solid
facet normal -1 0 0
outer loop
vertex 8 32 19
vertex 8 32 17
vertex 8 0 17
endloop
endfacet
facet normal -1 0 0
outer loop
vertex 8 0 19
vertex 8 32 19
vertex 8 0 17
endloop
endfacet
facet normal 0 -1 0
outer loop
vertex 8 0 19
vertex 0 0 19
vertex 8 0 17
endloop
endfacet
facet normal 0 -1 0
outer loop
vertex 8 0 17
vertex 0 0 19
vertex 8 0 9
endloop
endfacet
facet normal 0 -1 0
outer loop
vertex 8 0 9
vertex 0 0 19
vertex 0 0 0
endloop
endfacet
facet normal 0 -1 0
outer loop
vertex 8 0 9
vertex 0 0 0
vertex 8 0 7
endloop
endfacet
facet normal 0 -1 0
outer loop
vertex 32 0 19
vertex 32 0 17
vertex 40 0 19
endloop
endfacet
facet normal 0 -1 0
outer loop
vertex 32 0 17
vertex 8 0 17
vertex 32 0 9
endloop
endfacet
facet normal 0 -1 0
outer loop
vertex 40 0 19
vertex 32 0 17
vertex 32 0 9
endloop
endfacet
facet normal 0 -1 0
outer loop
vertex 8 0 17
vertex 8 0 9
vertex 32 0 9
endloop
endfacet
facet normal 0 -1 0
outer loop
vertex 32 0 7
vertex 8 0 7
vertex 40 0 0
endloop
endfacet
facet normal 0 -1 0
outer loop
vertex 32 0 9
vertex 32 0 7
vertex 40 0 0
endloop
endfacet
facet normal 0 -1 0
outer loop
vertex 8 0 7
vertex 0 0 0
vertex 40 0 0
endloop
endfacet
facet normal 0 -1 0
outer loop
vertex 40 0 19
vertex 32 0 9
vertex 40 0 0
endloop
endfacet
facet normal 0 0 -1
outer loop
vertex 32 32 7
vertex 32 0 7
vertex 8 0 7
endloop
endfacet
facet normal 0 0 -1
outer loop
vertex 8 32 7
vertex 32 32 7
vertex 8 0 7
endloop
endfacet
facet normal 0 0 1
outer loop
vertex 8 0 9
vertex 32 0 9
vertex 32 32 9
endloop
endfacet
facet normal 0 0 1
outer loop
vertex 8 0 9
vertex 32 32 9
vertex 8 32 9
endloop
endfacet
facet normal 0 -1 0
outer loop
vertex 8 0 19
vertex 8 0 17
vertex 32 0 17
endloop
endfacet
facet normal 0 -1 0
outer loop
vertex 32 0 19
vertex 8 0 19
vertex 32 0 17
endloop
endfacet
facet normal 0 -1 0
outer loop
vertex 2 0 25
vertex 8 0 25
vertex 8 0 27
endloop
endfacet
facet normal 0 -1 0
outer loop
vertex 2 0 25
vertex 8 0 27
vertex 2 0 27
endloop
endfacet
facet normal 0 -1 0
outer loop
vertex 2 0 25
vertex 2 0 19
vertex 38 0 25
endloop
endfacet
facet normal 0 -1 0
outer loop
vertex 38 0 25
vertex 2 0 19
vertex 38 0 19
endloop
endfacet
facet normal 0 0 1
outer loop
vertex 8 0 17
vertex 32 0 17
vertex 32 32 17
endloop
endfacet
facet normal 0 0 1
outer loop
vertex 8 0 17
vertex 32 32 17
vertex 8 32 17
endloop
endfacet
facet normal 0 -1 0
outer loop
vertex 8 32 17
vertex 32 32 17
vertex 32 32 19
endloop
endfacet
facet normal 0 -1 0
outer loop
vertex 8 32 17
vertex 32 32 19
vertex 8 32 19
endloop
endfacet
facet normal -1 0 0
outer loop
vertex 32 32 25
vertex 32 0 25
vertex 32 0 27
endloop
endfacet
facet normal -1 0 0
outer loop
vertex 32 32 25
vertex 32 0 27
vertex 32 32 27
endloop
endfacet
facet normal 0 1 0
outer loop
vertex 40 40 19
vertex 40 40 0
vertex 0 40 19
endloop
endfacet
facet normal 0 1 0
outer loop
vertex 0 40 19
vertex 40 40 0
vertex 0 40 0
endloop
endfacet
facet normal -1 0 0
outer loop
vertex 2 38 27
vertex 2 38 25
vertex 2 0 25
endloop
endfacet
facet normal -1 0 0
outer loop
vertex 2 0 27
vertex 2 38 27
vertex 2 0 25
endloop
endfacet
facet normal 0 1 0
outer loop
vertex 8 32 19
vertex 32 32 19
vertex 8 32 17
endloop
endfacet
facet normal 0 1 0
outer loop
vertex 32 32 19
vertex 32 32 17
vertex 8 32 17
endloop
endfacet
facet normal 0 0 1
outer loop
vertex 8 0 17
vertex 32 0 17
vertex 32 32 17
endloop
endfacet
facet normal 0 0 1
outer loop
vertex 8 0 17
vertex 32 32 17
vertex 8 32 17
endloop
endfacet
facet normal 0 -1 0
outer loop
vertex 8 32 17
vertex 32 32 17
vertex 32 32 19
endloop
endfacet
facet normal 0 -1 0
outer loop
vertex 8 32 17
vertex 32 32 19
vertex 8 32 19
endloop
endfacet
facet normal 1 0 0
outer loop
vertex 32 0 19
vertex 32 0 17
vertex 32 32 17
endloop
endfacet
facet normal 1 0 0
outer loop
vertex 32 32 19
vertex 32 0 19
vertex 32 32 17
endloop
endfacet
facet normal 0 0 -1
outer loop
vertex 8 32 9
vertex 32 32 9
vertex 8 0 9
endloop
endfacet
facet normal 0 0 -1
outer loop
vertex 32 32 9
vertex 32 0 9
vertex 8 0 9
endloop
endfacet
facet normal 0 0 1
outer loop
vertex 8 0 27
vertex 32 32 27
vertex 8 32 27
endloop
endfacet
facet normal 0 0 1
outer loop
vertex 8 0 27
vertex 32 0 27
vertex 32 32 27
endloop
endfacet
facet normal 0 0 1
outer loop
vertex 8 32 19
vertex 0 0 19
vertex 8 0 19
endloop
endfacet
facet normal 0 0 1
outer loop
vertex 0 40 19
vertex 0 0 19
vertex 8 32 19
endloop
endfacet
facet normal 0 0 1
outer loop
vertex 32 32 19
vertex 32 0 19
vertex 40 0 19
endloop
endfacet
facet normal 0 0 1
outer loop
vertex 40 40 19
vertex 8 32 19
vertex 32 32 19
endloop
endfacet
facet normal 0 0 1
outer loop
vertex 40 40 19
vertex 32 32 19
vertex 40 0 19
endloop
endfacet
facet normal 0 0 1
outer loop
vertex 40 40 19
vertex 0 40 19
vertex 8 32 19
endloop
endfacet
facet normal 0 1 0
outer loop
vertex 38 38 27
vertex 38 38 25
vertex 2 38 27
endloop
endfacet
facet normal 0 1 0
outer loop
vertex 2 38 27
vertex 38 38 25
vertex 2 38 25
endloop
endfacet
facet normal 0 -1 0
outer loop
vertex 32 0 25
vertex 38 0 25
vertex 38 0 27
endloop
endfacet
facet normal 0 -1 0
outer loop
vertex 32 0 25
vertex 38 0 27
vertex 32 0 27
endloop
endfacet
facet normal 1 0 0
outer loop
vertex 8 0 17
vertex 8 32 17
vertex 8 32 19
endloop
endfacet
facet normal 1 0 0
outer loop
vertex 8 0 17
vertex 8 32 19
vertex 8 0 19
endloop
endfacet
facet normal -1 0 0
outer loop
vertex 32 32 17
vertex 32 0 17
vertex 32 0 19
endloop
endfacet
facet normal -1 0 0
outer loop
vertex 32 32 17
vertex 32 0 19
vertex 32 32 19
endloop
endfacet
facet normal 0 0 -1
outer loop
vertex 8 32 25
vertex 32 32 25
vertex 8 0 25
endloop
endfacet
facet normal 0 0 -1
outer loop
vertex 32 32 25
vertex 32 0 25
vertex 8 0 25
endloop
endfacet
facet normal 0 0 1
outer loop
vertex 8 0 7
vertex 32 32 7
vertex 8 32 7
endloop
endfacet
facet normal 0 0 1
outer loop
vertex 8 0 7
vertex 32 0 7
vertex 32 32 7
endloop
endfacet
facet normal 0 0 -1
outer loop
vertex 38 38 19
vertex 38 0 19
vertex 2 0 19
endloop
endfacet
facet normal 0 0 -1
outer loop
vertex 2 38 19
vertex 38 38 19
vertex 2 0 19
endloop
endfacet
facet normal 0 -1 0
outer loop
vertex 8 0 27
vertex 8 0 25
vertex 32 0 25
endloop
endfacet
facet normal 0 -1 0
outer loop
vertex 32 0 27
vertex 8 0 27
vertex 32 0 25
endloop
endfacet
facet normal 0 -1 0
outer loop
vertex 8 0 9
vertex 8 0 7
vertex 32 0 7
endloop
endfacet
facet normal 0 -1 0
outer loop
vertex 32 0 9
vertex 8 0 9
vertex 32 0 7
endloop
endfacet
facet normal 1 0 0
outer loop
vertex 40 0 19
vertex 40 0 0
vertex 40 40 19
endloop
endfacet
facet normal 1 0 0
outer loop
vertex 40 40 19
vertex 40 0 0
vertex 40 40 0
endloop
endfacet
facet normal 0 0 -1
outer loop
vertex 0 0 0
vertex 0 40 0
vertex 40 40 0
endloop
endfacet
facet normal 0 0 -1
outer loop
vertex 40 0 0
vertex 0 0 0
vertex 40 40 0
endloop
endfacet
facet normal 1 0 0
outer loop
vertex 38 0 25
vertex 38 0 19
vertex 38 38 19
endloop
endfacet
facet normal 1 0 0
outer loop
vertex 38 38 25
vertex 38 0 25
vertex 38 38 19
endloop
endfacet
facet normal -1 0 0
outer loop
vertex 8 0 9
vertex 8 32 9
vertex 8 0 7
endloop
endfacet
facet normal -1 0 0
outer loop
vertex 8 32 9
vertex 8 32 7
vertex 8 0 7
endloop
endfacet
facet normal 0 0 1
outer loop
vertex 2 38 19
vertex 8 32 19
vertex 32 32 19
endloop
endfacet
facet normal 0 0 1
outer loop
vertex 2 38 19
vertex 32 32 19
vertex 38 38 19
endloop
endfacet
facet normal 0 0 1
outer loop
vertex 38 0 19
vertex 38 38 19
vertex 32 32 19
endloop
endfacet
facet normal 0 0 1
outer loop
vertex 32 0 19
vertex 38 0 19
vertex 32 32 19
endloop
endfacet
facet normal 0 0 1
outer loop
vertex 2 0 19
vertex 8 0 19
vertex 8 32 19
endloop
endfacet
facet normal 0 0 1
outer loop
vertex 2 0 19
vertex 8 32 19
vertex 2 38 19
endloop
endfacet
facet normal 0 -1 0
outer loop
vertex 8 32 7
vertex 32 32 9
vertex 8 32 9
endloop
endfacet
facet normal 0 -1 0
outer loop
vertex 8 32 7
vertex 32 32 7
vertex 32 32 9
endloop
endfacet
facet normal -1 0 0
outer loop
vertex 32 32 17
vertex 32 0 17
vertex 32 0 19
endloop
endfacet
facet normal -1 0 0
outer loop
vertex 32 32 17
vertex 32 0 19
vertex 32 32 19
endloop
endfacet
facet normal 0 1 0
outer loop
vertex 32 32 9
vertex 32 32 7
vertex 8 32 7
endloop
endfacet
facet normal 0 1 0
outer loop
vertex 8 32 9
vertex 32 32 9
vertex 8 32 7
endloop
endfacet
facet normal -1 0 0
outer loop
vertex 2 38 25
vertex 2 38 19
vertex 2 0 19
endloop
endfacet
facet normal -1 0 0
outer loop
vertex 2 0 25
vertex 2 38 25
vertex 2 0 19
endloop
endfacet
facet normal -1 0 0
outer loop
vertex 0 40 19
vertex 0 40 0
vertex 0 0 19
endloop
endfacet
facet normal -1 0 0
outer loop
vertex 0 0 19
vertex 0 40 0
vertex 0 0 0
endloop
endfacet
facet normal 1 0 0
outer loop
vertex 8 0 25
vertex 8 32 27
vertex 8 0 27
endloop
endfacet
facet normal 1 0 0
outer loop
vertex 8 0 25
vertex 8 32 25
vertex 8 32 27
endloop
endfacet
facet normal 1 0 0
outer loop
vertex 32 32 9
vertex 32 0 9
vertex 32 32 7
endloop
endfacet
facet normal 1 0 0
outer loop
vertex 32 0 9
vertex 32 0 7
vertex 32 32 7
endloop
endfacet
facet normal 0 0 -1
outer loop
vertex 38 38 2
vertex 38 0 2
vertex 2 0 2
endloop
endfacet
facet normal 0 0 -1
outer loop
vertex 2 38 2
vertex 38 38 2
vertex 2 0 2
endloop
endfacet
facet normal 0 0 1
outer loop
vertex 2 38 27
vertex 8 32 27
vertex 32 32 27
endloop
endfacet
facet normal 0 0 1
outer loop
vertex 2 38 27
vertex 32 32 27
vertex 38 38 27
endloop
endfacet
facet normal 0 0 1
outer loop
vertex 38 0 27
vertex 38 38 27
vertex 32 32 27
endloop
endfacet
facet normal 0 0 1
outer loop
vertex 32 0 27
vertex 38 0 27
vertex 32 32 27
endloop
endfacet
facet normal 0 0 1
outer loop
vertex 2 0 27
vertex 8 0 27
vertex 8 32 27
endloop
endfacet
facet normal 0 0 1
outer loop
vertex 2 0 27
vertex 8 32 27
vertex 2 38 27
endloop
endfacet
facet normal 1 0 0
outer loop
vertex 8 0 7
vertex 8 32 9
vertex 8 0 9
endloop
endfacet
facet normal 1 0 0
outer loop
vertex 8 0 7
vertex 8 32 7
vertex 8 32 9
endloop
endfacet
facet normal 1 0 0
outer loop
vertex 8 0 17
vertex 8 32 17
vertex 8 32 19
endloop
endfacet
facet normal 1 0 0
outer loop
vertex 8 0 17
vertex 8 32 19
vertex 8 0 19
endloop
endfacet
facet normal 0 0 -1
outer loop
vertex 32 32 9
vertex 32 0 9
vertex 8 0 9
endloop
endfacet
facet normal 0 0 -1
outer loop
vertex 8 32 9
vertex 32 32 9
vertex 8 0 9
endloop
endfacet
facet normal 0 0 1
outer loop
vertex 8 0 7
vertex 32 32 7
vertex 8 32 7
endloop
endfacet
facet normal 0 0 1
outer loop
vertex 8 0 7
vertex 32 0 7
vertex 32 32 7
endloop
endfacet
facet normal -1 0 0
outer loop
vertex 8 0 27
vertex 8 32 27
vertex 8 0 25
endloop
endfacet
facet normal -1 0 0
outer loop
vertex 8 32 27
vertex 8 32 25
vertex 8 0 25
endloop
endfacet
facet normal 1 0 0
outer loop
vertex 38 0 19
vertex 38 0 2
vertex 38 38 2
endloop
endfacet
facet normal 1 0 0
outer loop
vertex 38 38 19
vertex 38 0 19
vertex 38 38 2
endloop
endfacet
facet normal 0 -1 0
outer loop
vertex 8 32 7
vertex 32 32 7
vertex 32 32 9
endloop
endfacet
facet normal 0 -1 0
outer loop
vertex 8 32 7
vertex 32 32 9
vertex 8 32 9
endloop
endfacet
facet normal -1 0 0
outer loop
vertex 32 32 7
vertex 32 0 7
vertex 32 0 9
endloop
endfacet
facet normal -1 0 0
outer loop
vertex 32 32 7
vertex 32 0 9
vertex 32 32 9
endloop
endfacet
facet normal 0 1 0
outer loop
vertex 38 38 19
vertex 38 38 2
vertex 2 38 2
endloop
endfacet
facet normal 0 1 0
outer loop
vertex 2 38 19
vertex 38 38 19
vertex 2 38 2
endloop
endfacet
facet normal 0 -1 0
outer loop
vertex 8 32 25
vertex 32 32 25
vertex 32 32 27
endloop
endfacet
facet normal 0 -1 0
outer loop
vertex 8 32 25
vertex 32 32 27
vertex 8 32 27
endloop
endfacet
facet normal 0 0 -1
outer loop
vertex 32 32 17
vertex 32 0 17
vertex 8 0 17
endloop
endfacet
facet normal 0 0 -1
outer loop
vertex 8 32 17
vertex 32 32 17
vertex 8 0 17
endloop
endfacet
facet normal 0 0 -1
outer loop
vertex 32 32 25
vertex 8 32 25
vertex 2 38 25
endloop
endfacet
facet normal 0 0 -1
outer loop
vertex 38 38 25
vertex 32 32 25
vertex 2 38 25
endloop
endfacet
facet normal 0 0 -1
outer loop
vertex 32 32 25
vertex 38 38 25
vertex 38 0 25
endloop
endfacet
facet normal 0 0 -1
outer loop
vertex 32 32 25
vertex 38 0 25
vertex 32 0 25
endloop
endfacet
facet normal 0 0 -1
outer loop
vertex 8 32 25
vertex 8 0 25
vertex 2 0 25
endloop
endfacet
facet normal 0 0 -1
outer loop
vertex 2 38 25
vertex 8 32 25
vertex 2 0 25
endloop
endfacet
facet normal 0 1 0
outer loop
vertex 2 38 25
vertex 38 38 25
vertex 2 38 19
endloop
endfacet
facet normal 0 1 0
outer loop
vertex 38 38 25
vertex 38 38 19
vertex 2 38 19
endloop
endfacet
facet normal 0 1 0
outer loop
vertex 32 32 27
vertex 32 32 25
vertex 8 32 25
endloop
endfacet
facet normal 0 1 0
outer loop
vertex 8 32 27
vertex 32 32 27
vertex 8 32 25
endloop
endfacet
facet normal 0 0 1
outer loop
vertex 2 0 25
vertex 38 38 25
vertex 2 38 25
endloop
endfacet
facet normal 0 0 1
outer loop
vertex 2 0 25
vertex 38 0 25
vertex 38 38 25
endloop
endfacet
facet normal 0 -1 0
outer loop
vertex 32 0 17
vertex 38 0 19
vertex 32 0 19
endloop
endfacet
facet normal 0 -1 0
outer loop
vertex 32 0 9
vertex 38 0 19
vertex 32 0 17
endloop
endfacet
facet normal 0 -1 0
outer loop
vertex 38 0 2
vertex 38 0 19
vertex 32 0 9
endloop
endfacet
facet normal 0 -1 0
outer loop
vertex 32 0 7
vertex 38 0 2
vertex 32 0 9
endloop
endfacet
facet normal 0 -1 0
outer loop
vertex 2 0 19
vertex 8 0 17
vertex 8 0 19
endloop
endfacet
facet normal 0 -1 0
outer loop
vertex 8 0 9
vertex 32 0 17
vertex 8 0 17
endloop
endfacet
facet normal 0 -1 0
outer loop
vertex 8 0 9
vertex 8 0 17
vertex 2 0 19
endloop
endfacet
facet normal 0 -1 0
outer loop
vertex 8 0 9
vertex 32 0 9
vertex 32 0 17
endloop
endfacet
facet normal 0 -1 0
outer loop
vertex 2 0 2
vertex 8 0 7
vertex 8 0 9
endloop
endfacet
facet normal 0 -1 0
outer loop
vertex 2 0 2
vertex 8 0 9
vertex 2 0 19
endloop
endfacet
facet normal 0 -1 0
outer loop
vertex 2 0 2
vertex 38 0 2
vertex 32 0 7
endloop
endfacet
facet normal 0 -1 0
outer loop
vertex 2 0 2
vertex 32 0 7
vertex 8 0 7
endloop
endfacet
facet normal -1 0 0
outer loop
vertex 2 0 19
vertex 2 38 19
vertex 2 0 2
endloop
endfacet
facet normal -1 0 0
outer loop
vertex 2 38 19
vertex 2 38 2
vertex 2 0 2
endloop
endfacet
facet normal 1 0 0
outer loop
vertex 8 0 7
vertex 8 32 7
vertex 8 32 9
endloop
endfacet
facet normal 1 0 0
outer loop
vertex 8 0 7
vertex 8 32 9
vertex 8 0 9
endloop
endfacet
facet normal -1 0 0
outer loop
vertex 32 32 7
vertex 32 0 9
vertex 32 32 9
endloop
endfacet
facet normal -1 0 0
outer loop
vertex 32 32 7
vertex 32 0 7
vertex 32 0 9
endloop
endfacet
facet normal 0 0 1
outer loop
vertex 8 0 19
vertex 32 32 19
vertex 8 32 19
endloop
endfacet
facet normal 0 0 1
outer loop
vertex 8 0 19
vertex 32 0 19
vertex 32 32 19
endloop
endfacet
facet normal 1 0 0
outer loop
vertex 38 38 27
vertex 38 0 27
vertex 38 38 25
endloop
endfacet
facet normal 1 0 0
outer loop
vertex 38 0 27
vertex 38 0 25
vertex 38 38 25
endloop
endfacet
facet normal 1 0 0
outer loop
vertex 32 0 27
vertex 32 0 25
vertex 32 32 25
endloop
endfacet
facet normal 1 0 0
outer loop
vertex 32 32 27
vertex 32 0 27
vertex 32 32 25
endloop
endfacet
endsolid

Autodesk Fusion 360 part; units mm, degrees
sketch "Esquisse1" plane through (0, 0, 0) normal (0, 0, 1) x (1, 0, 0)
  line L0 (0, 0) -> (40, 0)
  line L1 (40, 0) -> (40, 40)
  line L2 (40, 40) -> (0, 40)
  line L3 (0, 40) -> (0, 0)
  dimension "d11" = 40
  dimension "d12" = 40
sketch "Esquisse1 (2)" plane through (0, 0, 2) normal (0, 0, 1) x (-1, 0, 0) in component "Shield"
  line L0 (0, -36) -> (0, 0)
  line L1 (0, 0) -> (-36, 0)
  line L2 (-36, 0) -> (-36, -36)
  line L3 (-36, -36) -> (0, -36)
  line L4 (0, -36) -> (-2, -36)
  line L5 (-2, -36) -> (-2, 4)
  line L6 (-2, 4) -> (0, 4)
  line L7 (0, 4) -> (0, -36)
  line L8 (0, -36) -> (-40, -36)
  line L9 (-40, -36) -> (-40, -34)
  line L10 (-40, -34) -> (0, -34)
  line L11 (0, -34) -> (0, -36)
  line L12 (-40, -36) -> (-38, -36)
  line L13 (-38, -36) -> (-38, 4)
  line L14 (-38, 4) -> (-40, 4)
  line L15 (-40, 4) -> (-40, -36)
  line L16 (-40, 4) -> (0, 4)
  line L17 (0, 4) -> (0, 2)
  line L18 (0, 2) -> (-40, 2)
  line L19 (-40, 2) -> (-40, 4)
  dimension "d15" = 2
  dimension "d16" = 40
  dimension "d17" = 40
  dimension "d18" = 2
  dimension "d19" = 2
  dimension "d20" = 40
  dimension "d21" = 40
  dimension "d22" = 2
sketch "Esquisse2" plane through (0, 0, 2) normal (0, 0, 1) x (-1, 0, 0) in component "Shield"
  line L0 (-36, -2) -> (-34, -2)
  line L1 (-34, -2) -> (-34, -34)
  line L2 (-34, -34) -> (-2, -34)
  line L3 (-2, -34) -> (-2, -2)
  line L4 (-2, -2) -> (0, -2)
  line L5 (0, -2) -> (0, 0)
  line L6 (0, 0) -> (-36, 0)
  line L7 (-36, 0) -> (-36, -2)
sketch "Esquisse1 (3)" plane through (0, 0, 6) normal (0, 0, 1) x (-1, 0, 0) in component "e*"
  line L0 (-36, 0) -> (-36, -2)
  line L1 (-36, -2) -> (-34, -2)
  line L2 (-34, -2) -> (-34, -34)
  line L3 (-34, -34) -> (-2, -34)
  line L4 (-2, -34) -> (-2, -2)
  line L5 (-2, -2) -> (0, -2)
  line L6 (0, -2) -> (0, 0)
  line L7 (0, 0) -> (-36, 0)
  line L8 (-8, -28) -> (-28, -28)
  line L9 (-28, -28) -> (-28, -3.2536)
  line L10 (-28, -3.2536) -> (-8, -3.2536)
  line L11 (-8, -3.2536) -> (-8, -28)
  dimension "d27" = 6
  dimension "d28" = 6
  dimension "d30" = 6
sketch "Esquisse1 (4)" plane through (0, 0, 16) normal (0, 0, 1) x (-1, 0, 0) in component "plaque_haut"
  line L0 (-2, 0) -> (-34, 0)
  line L1 (-34, 0) -> (-34, -34)
  line L2 (-34, -34) -> (-2, -34)
  line L3 (-2, -34) -> (-2, 0)
  line L4 (-6, -30) -> (-30, -30)
  line L5 (-30, -30) -> (-30, 0)
  line L6 (-30, 0) -> (-6, 0)
  line L7 (-6, 0) -> (-6, -30)
  dimension "d39" = 24
  dimension "d40" = 30
sketch "Esquisse1 (5)" plane through (0, 0, 18) normal (0, 0, 1) x (-1, 0, 0) in component "Mousse_haute"
  line L0 (0, -36) -> (0, -2)
  line L1 (0, -2) -> (-2, -2)
  line L2 (-2, -2) -> (-2, -34)
  line L3 (-2, -34) -> (-34, -34)
  line L4 (-34, -34) -> (-34, -2)
  line L5 (-34, -2) -> (-36, -2)
  line L6 (-36, -2) -> (-36, -36)
  line L7 (-36, -36) -> (0, -36)
  line L8 (0, -36) -> (-36, -36)
  line L9 (-36, -36) -> (-36, 0)
  line L10 (-36, 0) -> (0, 0)
  line L11 (0, 0) -> (0, -36)
sketch "Esquisse2 (2)" plane through (0, 0, 0) normal (0, 0, 1) x (1, 0, 0)
  line L0 (0, 0) -> (40, 0)
  line L1 (40, 0) -> (40, 40)
  line L2 (40, 40) -> (0, 40)
  line L3 (0, 40) -> (0, 0)
  dimension "d85" = 40
  dimension "d86" = 40
extrude "Extrusion4" add sketch "Esquisse2 (2)" along normal blind 2 makes body 1 in component "Shield"
sketch "Esquisse3" plane through (0, 0, 2) normal (0, 0, 1) x (-1, 0, 0)
  line L0 (0, -40) -> (0, 0)
  line L1 (0, 0) -> (-40, 0)
  line L2 (-40, 0) -> (-40, -40)
  line L3 (-40, -40) -> (0, -40)
  line L4 (0, -40) -> (-2, -40)
  line L5 (-2, -40) -> (-2, 0)
  line L6 (-2, 0) -> (0, 0)
  line L7 (0, 0) -> (0, -40)
  line L8 (0, -40) -> (-40, -40)
  line L9 (-40, -40) -> (-40, -38)
  line L10 (-40, -38) -> (0, -38)
  line L11 (0, -38) -> (0, -40)
  line L12 (-40, -40) -> (-38, -40)
  line L13 (-38, -40) -> (-38, 0)
  line L14 (-38, 0) -> (-40, 0)
  line L15 (-40, 0) -> (-40, -40)
  dimension "d89" = 2
  dimension "d90" = 40
  dimension "d91" = 40
  dimension "d92" = 2
  dimension "d93" = 2
  dimension "d94" = 40
extrude "Extrusion15" add sketch "Esquisse3" along normal blind 5 separate body contours L1 L5 L10 L13 makes body 2 in component "Support"
sketch "Esquisse1 (6)" plane through (0, 0, 7) normal (0, 0, 1) x (-1, 0, 0) in component "Plaque bas"
  line L0 (-38, -38) -> (-2, -38)
  line L1 (-2, -38) -> (-2, 0)
  line L2 (-2, 0) -> (-38, 0)
  line L3 (-38, 0) -> (-38, -38)
  line L4 (-8, 0) -> (-32, 0)
  line L5 (-32, 0) -> (-32, -32)
  line L6 (-32, -32) -> (-8, -32)
  line L7 (-8, -32) -> (-8, 0)
  dimension "d100" = 6
  dimension "d101" = 6
  dimension "d102" = 6
extrude "Extrusion16" add sketch "Esquisse1 (6)" along normal blind 2 contours L0 L1 L2 L3 L5 L6 L7 bodies 2 in component "Support"
extrude "Extrusion5" add 1 faces at (16, 21.3333, 7) along direction (0, 0, 1) blind 2 separate body on bodies 2 makes body 3 in component "Plaque bas"
extrude "Extrusion17" add 1 faces at (36, 23.3333, 9) along direction (0, 0, 1) blind 8 on bodies 2 bodies 2 in component "Support"
extrude "Extrusion18" add 1 faces at (16, 21.3333, 9) along direction (0, 0, 1) blind 8 on bodies 3 bodies 2 in component "Support"
sketch "Esquisse2 (3)" plane through (0, 0, 17) normal (0, 0, 1) x (-1, 0, 0) in component "plaque_haut"
  line L0 (-2, 0) -> (-38, 0)
  line L1 (-38, 0) -> (-38, -38)
  line L2 (-38, -38) -> (-2, -38)
  line L3 (-2, -38) -> (-2, 0)
  line L4 (-8, 0) -> (-32, 0)
  line L5 (-32, 0) -> (-32, -32)
  line L6 (-32, -32) -> (-8, -32)
  line L7 (-8, -32) -> (-8, 0)
  point P0 (-32, 0)
  dimension "d111" = 6
  dimension "d112" = 6
  dimension "d113" = 6
extrude "Extrusion5'" add sketch "Esquisse2 (3)" along normal blind 2 separate body contours L0 L4 L5 L6 L7 makes body 4 in component "plaque_haut"
extrude "Extrusion19" add 1 faces at (14, 12.6667, 17) along direction (0, 0, 1) blind 2 on bodies 2 bodies 2 in component "Support"
copy_body "CopierCollerCorps3" bodies 4 makes body 5 in component "Support"
combine "Combiner2" operation cut target body 2 tool bodies 5 in component "Support"
extrude "Extrusion2" add 1 faces at (16, 21.3333, 19) along direction (0, 0, 1) blind 6 separate body on bodies 4 makes body 6 in component "Mousse_haute"
extrude "Extrusion3" add 1 faces at (36, 23.3333, 19) along direction (0, 0, 1) blind 6 on bodies 2 bodies 6 in component "Mousse_haute"
extrude "Extrusion5''" add 1 faces at (13.3333, 13.3333, 2) along direction (0, 0, 1) blind 17 on bodies 1 bodies 1 in component "Shield"
copy_body "CopierCollerCorps1" bodies 3 makes body 7 in component "Shield"
copy_body "CopierCollerCorps2" bodies 4 7 makes body 8 makes body 9 in component "Shield"
copy_body "CopierCollerCorps3'" bodies 4 makes body 10 in component "Shield"
combine "Combiner1" operation cut target body 1 tool bodies 7 8 9 10 in component "Shield"
sketch "Esquisse1 (7)" plane through (0, 0, 25) normal (0, 0, 1) x (-1, 0, 0) in component "Support"
  line L0 (-2, 0) -> (-38, 0)
  line L1 (-38, 0) -> (-38, -38)
  line L2 (-38, -38) -> (-2, -38)
  line L3 (-2, -38) -> (-2, 0)
  line L4 (-8, 0) -> (-32, 0)
  line L5 (-32, 0) -> (-32, -32)
  line L6 (-32, -32) -> (-8, -32)
  line L7 (-8, -32) -> (-8, 0)
  dimension "d124" = 6
  dimension "d125" = 6
  dimension "d126" = 6
extrude "Extrusion2'" add sketch "Esquisse1 (7)" along normal blind 2 separate body contours L0 L4 L5 L6 L7 makes body 11 in component "plateau_conducteur"
extrude "Extrusion1" add 1 faces at (14, 12.6667, 25) along direction (0, 0, 1) blind 2 separate body on bodies 6 makes body 12 in component "plateau_non_conducteur"
copy_body "CopierCollerCorps1'" bodies 11 makes body 13 in component "plateau_non_conducteur"
combine "Combiner1'" operation cut target body 12 tool bodies 13 in component "plateau_non_conducteur"
component "Shield" placed x (1, 0, 0) y (0, 1, 0) z (0, 0, 1) at (0, 0, 0)
component "Plaque bas" placed x (1, 0, 0) y (0, 1, 0) z (0, 0, 1) at (0, 0, 0)
component "Support" placed x (1, 0, 0) y (0, 1, 0) z (0, 0, 1) at (0, 0, 0)
component "Mousse_basse" placed x (1, 0, 0) y (0, 1, 0) z (0, 0, 1) at (0, 0, 0)
component "plaque_haut" placed x (1, 0, 0) y (0, 1, 0) z (0, 0, 1) at (0, 0, 0)
component "Mousse_haute" placed x (1, 0, 0) y (0, 1, 0) z (0, 0, 1) at (0, 0, 0)
component "plateau_conducteur" placed x (1, 0, 0) y (0, 1, 0) z (0, 0, 1) at (0, 0, 0)
component "plateau_non_conducteur" placed x (1, 0, 0) y (0, 1, 0) z (0, 0, 1) at (0, 0, 0)
component "e*" placed x (1, 0, 0) y (0, 1, 0) z (0, 0, 1) at (0, 0, 0) in component "Plaque bas"
equation "Deltax = 8 mm"
equation "Largeur_electrode = 8 mm"
equation "Longeur = 20 mm"
equation "epaisseur_mousse = 6 mm"
equation "Hauteur_support = 5 mm"
equation "deltad = 8 mm"
equation "Hauteur = epaisseur_mousse + epaisseur_electrode + deltad + Hauteur_support"
equation "Largeur = Deltax + 2 * Largeur_electrode + 2 * distance_bord_electrode + 2 * epaisseur_electrode"
equation "epaisseur_electrode = 2 mm"
equation "distance_bord_electrode = 6 mm"
equation "d11 = Largeur"
equation "d12 = Largeur"
equation "d15 = epaisseur_electrode"
equation "d16 = Largeur"
equation "d17 = Largeur"
equation "d18 = epaisseur_electrode"
equation "d19 = epaisseur_electrode"
equation "d20 = Largeur"
equation "d21 = Largeur"
equation "d22 = epaisseur_electrode"
equation "d27 = distance_bord_electrode"
equation "d28 = distance_bord_electrode"
equation "d30 = distance_bord_electrode"
equation "d39 = Largeur - 2 * distance_bord_electrode - 2 * epaisseur_electrode"
equation "d40 = Largeur - distance_bord_electrode - 2 * epaisseur_electrode"
equation "d85 = Largeur"
equation "d86 = Largeur"
equation "d87 = epaisseur_electrode"
equation "d89 = epaisseur_electrode"
equation "d90 = Largeur"
equation "d91 = Largeur"
equation "d92 = epaisseur_electrode"
equation "d93 = epaisseur_electrode"
equation "d94 = Largeur"
equation "d95 = Hauteur_support"
equation "d100 = distance_bord_electrode"
equation "d101 = distance_bord_electrode"
equation "d102 = distance_bord_electrode"
equation "d103 = epaisseur_electrode"
equation "d105 = epaisseur_electrode"
equation "d107 = deltad"
equation "d109 = deltad"
equation "d111 = distance_bord_electrode"
equation "d112 = distance_bord_electrode"
equation "d113 = distance_bord_electrode"
equation "d114 = epaisseur_electrode"
equation "d116 = epaisseur_electrode"
equation "d118 = epaisseur_mousse"
equation "d120 = epaisseur_mousse"
equation "d122 = deltad + 2 * epaisseur_electrode + Hauteur_support"
equation "d124 = distance_bord_electrode"
equation "d125 = distance_bord_electrode"
equation "d126 = distance_bord_electrode"
equation "d127 = epaisseur_electrode"
equation "d129 = epaisseur_electrode"
